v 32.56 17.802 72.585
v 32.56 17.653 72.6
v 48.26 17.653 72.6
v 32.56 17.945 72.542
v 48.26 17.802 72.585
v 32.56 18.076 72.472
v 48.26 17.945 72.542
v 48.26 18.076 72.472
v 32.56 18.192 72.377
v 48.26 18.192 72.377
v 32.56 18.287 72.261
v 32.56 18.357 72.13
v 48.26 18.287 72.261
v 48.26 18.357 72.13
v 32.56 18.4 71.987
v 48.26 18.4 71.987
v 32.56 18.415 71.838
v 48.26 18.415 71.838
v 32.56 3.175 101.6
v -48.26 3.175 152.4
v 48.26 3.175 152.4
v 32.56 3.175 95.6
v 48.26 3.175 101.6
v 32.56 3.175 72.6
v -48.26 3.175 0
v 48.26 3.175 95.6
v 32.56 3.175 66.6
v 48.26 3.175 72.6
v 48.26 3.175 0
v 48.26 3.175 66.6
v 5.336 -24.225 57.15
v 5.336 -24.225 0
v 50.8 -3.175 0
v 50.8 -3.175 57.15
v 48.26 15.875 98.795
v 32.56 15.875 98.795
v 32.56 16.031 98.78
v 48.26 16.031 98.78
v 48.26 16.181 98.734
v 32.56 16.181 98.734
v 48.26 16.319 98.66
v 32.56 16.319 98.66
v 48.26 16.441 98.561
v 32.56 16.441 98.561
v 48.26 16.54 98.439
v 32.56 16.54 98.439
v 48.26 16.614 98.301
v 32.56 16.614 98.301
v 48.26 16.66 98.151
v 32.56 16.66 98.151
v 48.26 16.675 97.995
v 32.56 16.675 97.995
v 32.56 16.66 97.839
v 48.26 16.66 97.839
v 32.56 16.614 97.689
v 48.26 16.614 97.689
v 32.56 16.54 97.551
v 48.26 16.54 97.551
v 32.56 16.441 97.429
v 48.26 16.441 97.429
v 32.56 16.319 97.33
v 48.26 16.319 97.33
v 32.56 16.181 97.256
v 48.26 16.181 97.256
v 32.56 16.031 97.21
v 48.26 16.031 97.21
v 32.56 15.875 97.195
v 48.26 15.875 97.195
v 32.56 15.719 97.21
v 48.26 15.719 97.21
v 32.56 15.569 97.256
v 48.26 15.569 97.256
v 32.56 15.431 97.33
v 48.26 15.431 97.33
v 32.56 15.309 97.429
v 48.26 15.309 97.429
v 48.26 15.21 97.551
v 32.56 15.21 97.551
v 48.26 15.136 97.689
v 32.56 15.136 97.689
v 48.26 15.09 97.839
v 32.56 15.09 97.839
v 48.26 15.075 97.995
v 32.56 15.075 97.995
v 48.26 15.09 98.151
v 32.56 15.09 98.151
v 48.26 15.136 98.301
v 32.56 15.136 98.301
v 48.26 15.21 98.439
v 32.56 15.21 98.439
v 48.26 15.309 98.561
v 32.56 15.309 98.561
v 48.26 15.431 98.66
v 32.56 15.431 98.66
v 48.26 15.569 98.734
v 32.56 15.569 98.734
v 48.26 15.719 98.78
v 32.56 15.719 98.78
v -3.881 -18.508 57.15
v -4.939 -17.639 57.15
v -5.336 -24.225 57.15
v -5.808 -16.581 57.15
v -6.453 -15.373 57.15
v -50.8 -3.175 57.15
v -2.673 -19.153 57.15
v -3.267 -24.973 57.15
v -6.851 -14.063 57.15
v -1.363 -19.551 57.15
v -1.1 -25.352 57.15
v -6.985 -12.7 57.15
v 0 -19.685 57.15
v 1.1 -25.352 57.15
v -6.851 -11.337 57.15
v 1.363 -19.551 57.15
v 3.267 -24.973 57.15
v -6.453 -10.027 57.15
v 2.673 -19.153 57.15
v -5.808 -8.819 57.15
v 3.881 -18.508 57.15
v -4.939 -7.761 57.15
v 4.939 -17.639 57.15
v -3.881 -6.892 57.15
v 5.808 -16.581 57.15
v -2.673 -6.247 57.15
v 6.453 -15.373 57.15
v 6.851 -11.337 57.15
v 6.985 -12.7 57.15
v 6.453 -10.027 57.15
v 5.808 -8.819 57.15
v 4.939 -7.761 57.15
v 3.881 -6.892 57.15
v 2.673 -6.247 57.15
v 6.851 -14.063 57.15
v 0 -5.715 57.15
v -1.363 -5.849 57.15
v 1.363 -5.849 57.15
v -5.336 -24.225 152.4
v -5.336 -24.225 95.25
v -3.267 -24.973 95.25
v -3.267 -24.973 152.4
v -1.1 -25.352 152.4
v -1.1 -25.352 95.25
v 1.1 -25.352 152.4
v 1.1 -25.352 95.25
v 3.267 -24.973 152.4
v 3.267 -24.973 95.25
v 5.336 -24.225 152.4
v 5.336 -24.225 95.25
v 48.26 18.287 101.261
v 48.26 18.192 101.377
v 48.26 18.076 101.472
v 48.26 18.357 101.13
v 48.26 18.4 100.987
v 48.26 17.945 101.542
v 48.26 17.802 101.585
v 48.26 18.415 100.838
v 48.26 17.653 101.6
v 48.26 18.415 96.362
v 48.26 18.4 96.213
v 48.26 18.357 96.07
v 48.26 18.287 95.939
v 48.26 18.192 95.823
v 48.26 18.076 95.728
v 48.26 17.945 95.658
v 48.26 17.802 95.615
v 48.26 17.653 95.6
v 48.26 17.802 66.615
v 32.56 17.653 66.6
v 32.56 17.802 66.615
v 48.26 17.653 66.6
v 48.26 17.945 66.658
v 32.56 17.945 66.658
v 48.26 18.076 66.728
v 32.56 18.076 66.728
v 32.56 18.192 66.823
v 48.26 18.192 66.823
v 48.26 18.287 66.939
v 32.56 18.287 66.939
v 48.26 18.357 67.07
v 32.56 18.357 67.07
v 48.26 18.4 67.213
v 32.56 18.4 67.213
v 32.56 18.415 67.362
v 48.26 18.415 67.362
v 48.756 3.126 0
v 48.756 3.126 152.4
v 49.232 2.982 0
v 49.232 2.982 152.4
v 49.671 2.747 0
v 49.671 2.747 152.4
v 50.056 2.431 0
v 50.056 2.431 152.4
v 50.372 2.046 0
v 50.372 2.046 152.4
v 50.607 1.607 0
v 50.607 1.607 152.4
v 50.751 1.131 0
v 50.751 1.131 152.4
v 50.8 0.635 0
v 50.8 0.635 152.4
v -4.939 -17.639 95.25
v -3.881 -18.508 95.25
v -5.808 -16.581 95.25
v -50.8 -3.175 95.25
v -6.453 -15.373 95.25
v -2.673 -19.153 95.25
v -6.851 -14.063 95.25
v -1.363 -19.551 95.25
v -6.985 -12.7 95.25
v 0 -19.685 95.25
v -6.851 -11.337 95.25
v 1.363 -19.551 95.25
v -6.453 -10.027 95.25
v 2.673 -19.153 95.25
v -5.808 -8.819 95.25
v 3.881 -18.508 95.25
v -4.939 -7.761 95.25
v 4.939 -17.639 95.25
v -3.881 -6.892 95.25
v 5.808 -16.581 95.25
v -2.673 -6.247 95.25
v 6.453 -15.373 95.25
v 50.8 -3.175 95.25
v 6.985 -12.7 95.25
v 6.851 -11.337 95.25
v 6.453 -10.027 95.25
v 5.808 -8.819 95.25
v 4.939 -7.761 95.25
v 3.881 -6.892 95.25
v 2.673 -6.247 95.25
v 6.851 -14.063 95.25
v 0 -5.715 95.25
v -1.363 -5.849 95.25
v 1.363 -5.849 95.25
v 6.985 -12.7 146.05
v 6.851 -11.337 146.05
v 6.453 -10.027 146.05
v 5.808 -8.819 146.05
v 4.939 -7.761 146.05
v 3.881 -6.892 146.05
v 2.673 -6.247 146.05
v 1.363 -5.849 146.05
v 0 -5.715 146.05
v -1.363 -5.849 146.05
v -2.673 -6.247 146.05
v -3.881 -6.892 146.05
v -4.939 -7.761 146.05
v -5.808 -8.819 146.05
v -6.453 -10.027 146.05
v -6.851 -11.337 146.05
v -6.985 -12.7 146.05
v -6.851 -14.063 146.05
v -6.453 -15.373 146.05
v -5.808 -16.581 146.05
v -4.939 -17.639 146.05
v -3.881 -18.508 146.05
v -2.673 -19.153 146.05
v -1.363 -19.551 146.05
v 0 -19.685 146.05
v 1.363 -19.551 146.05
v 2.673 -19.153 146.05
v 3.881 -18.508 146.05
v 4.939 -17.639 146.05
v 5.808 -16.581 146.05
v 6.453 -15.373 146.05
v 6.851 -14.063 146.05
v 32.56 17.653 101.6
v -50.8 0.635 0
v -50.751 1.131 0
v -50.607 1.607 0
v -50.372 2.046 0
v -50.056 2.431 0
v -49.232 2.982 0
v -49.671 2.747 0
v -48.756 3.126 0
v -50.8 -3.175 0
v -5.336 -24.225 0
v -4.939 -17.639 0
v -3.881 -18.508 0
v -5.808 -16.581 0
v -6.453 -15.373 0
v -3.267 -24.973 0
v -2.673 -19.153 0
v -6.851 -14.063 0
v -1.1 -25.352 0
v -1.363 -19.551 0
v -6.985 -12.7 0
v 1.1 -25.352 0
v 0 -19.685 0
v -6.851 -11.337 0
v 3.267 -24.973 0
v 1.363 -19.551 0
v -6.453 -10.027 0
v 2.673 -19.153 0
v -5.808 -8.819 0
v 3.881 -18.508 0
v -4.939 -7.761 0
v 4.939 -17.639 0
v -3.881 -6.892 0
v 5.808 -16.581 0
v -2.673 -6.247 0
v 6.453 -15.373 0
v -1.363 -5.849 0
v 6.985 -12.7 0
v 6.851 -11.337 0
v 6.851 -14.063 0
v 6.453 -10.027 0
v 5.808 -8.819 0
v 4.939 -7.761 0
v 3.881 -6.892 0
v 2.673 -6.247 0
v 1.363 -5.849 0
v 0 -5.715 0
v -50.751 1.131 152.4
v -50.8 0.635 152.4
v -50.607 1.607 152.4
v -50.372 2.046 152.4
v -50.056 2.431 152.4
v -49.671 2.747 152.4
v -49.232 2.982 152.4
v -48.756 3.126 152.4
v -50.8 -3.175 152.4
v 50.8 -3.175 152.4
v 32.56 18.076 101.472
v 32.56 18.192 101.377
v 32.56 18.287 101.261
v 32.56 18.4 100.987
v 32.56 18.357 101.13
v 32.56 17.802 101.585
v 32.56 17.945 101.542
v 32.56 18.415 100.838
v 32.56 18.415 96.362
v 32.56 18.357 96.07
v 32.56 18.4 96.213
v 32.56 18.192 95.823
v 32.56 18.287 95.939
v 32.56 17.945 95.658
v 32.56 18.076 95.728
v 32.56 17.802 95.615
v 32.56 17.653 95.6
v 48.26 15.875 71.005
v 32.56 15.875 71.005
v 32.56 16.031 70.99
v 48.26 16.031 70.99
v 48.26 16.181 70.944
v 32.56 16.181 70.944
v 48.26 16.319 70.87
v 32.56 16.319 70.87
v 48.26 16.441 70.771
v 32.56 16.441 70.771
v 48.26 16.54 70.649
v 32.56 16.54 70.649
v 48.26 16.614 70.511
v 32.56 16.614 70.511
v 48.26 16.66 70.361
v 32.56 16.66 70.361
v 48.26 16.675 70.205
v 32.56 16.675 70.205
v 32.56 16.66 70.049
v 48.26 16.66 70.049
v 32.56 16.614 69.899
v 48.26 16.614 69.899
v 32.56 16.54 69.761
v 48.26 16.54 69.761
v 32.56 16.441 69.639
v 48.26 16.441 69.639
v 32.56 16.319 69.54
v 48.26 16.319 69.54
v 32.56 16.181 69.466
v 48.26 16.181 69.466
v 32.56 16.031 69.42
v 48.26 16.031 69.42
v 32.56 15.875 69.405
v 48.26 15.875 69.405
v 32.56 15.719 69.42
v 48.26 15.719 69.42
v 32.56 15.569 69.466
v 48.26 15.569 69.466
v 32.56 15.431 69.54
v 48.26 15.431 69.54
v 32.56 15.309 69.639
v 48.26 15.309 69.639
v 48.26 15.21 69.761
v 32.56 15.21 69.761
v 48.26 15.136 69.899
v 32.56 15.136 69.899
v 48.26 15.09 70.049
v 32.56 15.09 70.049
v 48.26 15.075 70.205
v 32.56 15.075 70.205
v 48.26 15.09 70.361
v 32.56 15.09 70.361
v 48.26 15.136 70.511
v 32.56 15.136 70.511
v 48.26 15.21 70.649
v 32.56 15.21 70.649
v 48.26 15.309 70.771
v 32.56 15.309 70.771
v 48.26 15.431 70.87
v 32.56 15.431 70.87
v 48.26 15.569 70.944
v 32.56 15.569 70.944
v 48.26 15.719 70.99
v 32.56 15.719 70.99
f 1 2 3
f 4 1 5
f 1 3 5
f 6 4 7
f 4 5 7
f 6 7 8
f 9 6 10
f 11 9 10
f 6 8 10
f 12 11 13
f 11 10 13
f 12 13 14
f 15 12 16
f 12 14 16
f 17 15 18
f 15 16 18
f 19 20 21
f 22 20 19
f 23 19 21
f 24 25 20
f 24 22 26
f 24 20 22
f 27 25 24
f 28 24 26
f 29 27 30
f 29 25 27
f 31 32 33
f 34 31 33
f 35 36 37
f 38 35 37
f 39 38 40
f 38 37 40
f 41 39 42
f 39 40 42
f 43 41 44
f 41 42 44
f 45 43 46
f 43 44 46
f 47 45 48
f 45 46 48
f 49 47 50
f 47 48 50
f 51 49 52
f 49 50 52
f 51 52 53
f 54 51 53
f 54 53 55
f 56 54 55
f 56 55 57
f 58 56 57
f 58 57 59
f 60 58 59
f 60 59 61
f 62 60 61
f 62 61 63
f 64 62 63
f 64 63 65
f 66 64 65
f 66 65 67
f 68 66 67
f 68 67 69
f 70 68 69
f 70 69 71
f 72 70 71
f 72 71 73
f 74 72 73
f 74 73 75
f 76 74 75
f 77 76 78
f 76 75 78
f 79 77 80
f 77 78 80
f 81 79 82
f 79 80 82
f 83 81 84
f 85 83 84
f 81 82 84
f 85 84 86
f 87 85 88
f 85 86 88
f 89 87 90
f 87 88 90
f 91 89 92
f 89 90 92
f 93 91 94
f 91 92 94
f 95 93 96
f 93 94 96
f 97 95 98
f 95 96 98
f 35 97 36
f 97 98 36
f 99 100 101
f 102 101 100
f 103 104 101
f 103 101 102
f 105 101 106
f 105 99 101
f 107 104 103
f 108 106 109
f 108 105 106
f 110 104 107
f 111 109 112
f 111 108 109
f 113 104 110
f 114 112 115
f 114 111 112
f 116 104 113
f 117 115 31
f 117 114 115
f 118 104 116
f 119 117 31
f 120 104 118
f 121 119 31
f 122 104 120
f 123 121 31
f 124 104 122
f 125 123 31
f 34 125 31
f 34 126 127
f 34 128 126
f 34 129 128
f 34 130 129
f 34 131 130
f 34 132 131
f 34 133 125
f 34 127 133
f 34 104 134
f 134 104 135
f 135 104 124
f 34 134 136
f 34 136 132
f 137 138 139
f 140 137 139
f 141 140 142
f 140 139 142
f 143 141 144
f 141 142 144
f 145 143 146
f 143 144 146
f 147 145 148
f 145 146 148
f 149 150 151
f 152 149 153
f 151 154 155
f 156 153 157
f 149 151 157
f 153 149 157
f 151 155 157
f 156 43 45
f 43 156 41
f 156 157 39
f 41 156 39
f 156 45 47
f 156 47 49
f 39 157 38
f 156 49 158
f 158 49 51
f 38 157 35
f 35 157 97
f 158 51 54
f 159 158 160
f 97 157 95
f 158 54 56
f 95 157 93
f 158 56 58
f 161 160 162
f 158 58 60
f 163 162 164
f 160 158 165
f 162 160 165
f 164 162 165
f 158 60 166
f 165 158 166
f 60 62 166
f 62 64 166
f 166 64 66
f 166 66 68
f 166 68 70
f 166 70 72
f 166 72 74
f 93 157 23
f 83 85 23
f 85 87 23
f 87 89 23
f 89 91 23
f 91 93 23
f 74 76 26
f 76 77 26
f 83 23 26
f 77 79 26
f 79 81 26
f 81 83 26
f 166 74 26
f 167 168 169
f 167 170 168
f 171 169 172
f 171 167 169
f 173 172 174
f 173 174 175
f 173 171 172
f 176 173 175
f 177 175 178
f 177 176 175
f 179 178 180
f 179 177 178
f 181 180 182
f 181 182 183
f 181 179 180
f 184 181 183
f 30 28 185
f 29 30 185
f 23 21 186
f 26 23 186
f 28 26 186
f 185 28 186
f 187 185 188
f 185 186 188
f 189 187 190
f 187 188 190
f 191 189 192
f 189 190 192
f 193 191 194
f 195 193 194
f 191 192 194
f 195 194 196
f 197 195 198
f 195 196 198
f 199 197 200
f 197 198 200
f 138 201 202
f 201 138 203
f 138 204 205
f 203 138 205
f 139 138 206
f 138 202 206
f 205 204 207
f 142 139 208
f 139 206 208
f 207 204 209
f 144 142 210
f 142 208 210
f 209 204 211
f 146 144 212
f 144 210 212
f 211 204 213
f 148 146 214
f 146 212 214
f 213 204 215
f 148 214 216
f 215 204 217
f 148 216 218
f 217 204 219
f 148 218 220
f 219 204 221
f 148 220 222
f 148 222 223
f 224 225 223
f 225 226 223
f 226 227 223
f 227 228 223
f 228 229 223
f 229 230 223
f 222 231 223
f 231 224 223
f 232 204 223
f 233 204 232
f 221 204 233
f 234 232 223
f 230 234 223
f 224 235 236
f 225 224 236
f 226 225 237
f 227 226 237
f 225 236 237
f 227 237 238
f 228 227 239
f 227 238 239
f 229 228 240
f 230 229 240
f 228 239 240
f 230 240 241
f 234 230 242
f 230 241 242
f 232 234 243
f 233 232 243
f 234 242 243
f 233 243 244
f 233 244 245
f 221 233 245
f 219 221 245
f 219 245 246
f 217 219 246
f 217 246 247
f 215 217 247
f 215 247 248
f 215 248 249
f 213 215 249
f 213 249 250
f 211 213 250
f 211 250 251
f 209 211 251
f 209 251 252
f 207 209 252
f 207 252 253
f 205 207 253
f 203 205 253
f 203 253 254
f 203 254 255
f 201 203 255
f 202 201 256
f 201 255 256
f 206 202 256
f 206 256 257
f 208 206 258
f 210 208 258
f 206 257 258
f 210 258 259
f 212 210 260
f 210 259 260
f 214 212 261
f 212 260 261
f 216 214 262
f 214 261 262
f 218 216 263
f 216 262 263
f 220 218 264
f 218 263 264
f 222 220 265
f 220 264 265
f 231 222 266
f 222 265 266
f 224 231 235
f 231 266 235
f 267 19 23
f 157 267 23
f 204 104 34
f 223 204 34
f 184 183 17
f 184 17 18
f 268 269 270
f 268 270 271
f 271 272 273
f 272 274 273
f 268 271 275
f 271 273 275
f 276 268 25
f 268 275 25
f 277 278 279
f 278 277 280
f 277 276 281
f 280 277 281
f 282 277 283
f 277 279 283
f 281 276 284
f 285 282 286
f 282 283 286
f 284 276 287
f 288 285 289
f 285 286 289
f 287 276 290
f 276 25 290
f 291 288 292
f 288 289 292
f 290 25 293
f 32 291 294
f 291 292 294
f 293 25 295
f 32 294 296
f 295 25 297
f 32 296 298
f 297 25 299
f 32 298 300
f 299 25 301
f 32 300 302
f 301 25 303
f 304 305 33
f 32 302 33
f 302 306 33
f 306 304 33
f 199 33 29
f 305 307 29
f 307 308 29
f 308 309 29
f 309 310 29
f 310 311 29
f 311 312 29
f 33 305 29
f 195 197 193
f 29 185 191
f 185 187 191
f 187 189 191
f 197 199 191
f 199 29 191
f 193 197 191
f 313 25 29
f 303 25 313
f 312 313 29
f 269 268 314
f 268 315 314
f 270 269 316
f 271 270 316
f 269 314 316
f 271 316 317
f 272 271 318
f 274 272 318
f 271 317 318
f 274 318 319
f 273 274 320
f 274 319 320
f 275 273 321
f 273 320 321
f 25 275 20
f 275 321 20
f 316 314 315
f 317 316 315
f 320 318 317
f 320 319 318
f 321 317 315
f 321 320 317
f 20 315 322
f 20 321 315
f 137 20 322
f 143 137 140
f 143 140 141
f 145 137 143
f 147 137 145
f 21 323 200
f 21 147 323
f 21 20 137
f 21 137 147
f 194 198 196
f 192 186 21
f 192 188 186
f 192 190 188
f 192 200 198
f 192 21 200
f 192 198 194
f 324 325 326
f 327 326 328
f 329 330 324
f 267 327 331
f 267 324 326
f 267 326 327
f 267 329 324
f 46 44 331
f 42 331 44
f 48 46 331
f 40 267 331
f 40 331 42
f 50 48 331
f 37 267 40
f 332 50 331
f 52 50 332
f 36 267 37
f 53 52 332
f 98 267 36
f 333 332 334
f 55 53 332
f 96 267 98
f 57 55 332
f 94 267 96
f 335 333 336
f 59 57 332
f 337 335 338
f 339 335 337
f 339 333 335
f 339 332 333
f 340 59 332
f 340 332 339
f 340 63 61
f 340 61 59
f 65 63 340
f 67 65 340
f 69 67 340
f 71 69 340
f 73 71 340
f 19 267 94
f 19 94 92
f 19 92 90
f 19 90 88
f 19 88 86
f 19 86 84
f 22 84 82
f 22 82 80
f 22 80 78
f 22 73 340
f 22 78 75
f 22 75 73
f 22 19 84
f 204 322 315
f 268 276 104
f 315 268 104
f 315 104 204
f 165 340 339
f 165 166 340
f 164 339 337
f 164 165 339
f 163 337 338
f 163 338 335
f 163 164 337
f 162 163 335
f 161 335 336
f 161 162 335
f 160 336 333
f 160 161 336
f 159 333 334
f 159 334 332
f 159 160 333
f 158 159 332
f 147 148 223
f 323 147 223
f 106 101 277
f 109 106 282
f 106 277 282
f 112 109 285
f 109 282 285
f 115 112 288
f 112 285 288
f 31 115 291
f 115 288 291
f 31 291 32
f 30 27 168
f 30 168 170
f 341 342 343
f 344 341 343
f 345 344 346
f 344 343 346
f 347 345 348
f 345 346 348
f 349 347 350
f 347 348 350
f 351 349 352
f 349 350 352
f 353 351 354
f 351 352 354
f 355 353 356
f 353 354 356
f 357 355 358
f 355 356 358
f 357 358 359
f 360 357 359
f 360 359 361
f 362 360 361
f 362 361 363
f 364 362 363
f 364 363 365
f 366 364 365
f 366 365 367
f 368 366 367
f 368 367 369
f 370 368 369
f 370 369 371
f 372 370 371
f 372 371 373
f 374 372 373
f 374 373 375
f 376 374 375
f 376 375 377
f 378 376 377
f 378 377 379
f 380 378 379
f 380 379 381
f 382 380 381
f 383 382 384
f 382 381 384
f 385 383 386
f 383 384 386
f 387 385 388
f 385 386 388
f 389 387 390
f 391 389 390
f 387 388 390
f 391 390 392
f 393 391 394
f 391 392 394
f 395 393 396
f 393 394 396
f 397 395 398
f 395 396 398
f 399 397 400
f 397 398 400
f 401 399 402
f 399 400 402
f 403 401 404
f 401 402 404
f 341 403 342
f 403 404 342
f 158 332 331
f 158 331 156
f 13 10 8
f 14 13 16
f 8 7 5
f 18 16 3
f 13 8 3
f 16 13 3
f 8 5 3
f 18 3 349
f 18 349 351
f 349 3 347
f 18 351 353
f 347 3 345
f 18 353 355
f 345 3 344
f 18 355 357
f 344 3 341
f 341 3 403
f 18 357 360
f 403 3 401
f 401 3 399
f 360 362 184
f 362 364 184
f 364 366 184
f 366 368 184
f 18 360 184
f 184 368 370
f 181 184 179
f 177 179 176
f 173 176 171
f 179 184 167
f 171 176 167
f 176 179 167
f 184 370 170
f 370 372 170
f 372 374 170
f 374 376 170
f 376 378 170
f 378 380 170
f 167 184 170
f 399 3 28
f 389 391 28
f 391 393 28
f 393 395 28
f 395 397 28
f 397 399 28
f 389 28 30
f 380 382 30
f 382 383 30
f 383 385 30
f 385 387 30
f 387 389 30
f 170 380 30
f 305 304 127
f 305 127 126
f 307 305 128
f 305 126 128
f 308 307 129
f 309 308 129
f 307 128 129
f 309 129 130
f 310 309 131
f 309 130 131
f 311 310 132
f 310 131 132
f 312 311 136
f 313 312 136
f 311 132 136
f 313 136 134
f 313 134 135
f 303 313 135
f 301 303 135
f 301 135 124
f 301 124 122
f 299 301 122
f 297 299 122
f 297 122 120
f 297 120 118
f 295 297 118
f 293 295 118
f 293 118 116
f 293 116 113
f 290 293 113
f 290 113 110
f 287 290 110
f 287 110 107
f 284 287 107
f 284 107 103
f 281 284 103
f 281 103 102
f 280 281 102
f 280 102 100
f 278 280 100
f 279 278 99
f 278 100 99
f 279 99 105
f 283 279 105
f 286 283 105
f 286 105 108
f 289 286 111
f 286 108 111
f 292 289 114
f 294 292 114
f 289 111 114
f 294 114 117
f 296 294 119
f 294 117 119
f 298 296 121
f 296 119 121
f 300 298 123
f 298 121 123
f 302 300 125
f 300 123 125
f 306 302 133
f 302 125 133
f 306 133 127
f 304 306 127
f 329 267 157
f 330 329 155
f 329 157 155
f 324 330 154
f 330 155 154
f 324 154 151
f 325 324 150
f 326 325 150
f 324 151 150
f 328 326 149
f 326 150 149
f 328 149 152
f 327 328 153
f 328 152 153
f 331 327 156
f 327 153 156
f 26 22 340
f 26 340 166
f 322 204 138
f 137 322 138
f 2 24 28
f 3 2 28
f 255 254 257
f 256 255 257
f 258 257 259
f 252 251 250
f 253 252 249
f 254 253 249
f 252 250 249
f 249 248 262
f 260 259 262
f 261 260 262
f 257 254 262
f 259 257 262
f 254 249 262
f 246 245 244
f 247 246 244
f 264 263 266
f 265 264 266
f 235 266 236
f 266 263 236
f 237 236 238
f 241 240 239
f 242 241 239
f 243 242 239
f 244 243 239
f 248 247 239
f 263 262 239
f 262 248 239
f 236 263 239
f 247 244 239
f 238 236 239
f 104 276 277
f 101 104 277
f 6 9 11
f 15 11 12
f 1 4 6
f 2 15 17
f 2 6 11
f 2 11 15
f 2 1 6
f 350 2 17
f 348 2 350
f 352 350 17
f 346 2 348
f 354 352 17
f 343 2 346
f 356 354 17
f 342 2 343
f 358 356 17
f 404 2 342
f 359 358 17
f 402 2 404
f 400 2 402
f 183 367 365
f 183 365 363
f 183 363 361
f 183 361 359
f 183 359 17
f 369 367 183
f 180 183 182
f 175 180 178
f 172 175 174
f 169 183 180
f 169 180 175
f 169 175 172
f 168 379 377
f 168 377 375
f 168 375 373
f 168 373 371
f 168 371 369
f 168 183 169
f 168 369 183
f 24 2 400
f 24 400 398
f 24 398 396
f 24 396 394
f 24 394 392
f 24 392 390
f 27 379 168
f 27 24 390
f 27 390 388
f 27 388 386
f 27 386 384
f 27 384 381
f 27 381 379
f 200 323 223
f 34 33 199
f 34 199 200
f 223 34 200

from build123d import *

# Parameters (mm, degrees)
SKETCH2_W               = 101.6
SKETCH2_H               = 6.35
BOSS_EXTRUDE1_DEPTH     = 152.4
CUT_EXTRUDE1_START      = -6.35
SKETCH3_R               = 6.985
CUT_EXTRUDE1_DEPTH      = 157.289355631
CUT_EXTRUDE2_START      = -6.35
SKETCH4_W               = 101.6
SKETCH4_H               = 38.1
CUT_EXTRUDE2_DEPTH      = 157.815347501
FILLET4_R               = 2.54
SKETCH5_W               = 15.7
SKETCH5_H               = 6
BOSS_EXTRUDE2_DEPTH     = 15.24
SKETCH6_R               = 0.8
CUT_EXTRUDE4_DEPTH      = 176.555716512
FILLET7_R               = 0.762
FILLET8_R               = 0.762
TAP_DRILL_FOR_M2_TAP3_D = 1.6


with BuildPart() as part:
    # Sketch2 → Boss-Extrude1 (new body)
    with BuildSketch(Plane.XY):
        with BuildLine():
            Line((-50.8, -3.175), (-5.335878714, -24.224686475))
            ThreePointArc((-5.335878714, -24.224686475), (0, -25.4), (5.335878714, -24.224686475))
            Line((5.335878714, -24.224686475), (50.8, -3.175))
            Line((50.8, -3.175), (-50.8, -3.175))
        make_face()
        Rectangle(SKETCH2_W, SKETCH2_H)
    extrude(amount=BOSS_EXTRUDE1_DEPTH)

    # Sketch3 → Cut-Extrude1 (cut, through all)
    with BuildSketch(Plane.XY.offset(152.4).offset(CUT_EXTRUDE1_START)):
        with Locations((0, -12.7)):
            Circle(SKETCH3_R)
    extrude(amount=-CUT_EXTRUDE1_DEPTH, mode=Mode.SUBTRACT)

    # Sketch4 → Cut-Extrude2 (cut, through all)
    with BuildSketch(Plane(origin=(0, 3.175, 0), x_dir=(1, 0, 0), z_dir=(0, 1, 0)).offset(CUT_EXTRUDE2_START)):
        with Locations((0, -76.2)):
            Rectangle(SKETCH4_W, SKETCH4_H)
    extrude(amount=-CUT_EXTRUDE2_DEPTH, mode=Mode.SUBTRACT)

    # Fillet4
    fillet4_edges = [part.edges().sort_by_distance(p)[0] for p in [
        (-50.8, 3.175, 76.2),
        (50.8, 3.175, 76.2),
    ]]
    fillet(fillet4_edges, radius=FILLET4_R)

    # Sketch5 → Boss-Extrude2 (add)
    with BuildSketch(Plane(origin=(0, 3.175, 0), x_dir=(1, 0, 0), z_dir=(0, 1, 0))):
        with Locations((40.41, -98.6)):
            Rectangle(SKETCH5_W, SKETCH5_H)
        with Locations((40.41, -69.6)):
            Rectangle(SKETCH5_W, SKETCH5_H)
    extrude(amount=BOSS_EXTRUDE2_DEPTH)

    # Sketch6 → Cut-Extrude4 (cut, through all)
    with BuildSketch(Plane.ZY.offset(-32.56)):
        with Locations((97.995000084, 15.875)):
            Circle(SKETCH6_R)
        with Locations((70.204999916, 15.875)):
            Circle(SKETCH6_R)
    extrude(amount=-CUT_EXTRUDE4_DEPTH, mode=Mode.SUBTRACT)

    # Fillet7
    fillet7_edges = [part.edges().sort_by_distance(p)[0] for p in [
        (40.41, 18.415, 95.6),
        (40.41, 18.415, 101.6),
    ]]
    fillet(fillet7_edges, radius=FILLET7_R)

    # Fillet8
    fillet8_edges = [part.edges().sort_by_distance(p)[0] for p in [
        (40.41, 18.415, 66.6),
        (40.41, 18.415, 72.6),
    ]]
    fillet(fillet8_edges, radius=FILLET8_R)

    # Tap Drill for M2 Tap3 (through all)
    with Locations(Plane.ZY.offset(-32.56)):
        with Locations((97.995000084, 15.875), (70.204999916, 15.875)):
            Hole(TAP_DRILL_FOR_M2_TAP3_D / 2)


solid = part.part
